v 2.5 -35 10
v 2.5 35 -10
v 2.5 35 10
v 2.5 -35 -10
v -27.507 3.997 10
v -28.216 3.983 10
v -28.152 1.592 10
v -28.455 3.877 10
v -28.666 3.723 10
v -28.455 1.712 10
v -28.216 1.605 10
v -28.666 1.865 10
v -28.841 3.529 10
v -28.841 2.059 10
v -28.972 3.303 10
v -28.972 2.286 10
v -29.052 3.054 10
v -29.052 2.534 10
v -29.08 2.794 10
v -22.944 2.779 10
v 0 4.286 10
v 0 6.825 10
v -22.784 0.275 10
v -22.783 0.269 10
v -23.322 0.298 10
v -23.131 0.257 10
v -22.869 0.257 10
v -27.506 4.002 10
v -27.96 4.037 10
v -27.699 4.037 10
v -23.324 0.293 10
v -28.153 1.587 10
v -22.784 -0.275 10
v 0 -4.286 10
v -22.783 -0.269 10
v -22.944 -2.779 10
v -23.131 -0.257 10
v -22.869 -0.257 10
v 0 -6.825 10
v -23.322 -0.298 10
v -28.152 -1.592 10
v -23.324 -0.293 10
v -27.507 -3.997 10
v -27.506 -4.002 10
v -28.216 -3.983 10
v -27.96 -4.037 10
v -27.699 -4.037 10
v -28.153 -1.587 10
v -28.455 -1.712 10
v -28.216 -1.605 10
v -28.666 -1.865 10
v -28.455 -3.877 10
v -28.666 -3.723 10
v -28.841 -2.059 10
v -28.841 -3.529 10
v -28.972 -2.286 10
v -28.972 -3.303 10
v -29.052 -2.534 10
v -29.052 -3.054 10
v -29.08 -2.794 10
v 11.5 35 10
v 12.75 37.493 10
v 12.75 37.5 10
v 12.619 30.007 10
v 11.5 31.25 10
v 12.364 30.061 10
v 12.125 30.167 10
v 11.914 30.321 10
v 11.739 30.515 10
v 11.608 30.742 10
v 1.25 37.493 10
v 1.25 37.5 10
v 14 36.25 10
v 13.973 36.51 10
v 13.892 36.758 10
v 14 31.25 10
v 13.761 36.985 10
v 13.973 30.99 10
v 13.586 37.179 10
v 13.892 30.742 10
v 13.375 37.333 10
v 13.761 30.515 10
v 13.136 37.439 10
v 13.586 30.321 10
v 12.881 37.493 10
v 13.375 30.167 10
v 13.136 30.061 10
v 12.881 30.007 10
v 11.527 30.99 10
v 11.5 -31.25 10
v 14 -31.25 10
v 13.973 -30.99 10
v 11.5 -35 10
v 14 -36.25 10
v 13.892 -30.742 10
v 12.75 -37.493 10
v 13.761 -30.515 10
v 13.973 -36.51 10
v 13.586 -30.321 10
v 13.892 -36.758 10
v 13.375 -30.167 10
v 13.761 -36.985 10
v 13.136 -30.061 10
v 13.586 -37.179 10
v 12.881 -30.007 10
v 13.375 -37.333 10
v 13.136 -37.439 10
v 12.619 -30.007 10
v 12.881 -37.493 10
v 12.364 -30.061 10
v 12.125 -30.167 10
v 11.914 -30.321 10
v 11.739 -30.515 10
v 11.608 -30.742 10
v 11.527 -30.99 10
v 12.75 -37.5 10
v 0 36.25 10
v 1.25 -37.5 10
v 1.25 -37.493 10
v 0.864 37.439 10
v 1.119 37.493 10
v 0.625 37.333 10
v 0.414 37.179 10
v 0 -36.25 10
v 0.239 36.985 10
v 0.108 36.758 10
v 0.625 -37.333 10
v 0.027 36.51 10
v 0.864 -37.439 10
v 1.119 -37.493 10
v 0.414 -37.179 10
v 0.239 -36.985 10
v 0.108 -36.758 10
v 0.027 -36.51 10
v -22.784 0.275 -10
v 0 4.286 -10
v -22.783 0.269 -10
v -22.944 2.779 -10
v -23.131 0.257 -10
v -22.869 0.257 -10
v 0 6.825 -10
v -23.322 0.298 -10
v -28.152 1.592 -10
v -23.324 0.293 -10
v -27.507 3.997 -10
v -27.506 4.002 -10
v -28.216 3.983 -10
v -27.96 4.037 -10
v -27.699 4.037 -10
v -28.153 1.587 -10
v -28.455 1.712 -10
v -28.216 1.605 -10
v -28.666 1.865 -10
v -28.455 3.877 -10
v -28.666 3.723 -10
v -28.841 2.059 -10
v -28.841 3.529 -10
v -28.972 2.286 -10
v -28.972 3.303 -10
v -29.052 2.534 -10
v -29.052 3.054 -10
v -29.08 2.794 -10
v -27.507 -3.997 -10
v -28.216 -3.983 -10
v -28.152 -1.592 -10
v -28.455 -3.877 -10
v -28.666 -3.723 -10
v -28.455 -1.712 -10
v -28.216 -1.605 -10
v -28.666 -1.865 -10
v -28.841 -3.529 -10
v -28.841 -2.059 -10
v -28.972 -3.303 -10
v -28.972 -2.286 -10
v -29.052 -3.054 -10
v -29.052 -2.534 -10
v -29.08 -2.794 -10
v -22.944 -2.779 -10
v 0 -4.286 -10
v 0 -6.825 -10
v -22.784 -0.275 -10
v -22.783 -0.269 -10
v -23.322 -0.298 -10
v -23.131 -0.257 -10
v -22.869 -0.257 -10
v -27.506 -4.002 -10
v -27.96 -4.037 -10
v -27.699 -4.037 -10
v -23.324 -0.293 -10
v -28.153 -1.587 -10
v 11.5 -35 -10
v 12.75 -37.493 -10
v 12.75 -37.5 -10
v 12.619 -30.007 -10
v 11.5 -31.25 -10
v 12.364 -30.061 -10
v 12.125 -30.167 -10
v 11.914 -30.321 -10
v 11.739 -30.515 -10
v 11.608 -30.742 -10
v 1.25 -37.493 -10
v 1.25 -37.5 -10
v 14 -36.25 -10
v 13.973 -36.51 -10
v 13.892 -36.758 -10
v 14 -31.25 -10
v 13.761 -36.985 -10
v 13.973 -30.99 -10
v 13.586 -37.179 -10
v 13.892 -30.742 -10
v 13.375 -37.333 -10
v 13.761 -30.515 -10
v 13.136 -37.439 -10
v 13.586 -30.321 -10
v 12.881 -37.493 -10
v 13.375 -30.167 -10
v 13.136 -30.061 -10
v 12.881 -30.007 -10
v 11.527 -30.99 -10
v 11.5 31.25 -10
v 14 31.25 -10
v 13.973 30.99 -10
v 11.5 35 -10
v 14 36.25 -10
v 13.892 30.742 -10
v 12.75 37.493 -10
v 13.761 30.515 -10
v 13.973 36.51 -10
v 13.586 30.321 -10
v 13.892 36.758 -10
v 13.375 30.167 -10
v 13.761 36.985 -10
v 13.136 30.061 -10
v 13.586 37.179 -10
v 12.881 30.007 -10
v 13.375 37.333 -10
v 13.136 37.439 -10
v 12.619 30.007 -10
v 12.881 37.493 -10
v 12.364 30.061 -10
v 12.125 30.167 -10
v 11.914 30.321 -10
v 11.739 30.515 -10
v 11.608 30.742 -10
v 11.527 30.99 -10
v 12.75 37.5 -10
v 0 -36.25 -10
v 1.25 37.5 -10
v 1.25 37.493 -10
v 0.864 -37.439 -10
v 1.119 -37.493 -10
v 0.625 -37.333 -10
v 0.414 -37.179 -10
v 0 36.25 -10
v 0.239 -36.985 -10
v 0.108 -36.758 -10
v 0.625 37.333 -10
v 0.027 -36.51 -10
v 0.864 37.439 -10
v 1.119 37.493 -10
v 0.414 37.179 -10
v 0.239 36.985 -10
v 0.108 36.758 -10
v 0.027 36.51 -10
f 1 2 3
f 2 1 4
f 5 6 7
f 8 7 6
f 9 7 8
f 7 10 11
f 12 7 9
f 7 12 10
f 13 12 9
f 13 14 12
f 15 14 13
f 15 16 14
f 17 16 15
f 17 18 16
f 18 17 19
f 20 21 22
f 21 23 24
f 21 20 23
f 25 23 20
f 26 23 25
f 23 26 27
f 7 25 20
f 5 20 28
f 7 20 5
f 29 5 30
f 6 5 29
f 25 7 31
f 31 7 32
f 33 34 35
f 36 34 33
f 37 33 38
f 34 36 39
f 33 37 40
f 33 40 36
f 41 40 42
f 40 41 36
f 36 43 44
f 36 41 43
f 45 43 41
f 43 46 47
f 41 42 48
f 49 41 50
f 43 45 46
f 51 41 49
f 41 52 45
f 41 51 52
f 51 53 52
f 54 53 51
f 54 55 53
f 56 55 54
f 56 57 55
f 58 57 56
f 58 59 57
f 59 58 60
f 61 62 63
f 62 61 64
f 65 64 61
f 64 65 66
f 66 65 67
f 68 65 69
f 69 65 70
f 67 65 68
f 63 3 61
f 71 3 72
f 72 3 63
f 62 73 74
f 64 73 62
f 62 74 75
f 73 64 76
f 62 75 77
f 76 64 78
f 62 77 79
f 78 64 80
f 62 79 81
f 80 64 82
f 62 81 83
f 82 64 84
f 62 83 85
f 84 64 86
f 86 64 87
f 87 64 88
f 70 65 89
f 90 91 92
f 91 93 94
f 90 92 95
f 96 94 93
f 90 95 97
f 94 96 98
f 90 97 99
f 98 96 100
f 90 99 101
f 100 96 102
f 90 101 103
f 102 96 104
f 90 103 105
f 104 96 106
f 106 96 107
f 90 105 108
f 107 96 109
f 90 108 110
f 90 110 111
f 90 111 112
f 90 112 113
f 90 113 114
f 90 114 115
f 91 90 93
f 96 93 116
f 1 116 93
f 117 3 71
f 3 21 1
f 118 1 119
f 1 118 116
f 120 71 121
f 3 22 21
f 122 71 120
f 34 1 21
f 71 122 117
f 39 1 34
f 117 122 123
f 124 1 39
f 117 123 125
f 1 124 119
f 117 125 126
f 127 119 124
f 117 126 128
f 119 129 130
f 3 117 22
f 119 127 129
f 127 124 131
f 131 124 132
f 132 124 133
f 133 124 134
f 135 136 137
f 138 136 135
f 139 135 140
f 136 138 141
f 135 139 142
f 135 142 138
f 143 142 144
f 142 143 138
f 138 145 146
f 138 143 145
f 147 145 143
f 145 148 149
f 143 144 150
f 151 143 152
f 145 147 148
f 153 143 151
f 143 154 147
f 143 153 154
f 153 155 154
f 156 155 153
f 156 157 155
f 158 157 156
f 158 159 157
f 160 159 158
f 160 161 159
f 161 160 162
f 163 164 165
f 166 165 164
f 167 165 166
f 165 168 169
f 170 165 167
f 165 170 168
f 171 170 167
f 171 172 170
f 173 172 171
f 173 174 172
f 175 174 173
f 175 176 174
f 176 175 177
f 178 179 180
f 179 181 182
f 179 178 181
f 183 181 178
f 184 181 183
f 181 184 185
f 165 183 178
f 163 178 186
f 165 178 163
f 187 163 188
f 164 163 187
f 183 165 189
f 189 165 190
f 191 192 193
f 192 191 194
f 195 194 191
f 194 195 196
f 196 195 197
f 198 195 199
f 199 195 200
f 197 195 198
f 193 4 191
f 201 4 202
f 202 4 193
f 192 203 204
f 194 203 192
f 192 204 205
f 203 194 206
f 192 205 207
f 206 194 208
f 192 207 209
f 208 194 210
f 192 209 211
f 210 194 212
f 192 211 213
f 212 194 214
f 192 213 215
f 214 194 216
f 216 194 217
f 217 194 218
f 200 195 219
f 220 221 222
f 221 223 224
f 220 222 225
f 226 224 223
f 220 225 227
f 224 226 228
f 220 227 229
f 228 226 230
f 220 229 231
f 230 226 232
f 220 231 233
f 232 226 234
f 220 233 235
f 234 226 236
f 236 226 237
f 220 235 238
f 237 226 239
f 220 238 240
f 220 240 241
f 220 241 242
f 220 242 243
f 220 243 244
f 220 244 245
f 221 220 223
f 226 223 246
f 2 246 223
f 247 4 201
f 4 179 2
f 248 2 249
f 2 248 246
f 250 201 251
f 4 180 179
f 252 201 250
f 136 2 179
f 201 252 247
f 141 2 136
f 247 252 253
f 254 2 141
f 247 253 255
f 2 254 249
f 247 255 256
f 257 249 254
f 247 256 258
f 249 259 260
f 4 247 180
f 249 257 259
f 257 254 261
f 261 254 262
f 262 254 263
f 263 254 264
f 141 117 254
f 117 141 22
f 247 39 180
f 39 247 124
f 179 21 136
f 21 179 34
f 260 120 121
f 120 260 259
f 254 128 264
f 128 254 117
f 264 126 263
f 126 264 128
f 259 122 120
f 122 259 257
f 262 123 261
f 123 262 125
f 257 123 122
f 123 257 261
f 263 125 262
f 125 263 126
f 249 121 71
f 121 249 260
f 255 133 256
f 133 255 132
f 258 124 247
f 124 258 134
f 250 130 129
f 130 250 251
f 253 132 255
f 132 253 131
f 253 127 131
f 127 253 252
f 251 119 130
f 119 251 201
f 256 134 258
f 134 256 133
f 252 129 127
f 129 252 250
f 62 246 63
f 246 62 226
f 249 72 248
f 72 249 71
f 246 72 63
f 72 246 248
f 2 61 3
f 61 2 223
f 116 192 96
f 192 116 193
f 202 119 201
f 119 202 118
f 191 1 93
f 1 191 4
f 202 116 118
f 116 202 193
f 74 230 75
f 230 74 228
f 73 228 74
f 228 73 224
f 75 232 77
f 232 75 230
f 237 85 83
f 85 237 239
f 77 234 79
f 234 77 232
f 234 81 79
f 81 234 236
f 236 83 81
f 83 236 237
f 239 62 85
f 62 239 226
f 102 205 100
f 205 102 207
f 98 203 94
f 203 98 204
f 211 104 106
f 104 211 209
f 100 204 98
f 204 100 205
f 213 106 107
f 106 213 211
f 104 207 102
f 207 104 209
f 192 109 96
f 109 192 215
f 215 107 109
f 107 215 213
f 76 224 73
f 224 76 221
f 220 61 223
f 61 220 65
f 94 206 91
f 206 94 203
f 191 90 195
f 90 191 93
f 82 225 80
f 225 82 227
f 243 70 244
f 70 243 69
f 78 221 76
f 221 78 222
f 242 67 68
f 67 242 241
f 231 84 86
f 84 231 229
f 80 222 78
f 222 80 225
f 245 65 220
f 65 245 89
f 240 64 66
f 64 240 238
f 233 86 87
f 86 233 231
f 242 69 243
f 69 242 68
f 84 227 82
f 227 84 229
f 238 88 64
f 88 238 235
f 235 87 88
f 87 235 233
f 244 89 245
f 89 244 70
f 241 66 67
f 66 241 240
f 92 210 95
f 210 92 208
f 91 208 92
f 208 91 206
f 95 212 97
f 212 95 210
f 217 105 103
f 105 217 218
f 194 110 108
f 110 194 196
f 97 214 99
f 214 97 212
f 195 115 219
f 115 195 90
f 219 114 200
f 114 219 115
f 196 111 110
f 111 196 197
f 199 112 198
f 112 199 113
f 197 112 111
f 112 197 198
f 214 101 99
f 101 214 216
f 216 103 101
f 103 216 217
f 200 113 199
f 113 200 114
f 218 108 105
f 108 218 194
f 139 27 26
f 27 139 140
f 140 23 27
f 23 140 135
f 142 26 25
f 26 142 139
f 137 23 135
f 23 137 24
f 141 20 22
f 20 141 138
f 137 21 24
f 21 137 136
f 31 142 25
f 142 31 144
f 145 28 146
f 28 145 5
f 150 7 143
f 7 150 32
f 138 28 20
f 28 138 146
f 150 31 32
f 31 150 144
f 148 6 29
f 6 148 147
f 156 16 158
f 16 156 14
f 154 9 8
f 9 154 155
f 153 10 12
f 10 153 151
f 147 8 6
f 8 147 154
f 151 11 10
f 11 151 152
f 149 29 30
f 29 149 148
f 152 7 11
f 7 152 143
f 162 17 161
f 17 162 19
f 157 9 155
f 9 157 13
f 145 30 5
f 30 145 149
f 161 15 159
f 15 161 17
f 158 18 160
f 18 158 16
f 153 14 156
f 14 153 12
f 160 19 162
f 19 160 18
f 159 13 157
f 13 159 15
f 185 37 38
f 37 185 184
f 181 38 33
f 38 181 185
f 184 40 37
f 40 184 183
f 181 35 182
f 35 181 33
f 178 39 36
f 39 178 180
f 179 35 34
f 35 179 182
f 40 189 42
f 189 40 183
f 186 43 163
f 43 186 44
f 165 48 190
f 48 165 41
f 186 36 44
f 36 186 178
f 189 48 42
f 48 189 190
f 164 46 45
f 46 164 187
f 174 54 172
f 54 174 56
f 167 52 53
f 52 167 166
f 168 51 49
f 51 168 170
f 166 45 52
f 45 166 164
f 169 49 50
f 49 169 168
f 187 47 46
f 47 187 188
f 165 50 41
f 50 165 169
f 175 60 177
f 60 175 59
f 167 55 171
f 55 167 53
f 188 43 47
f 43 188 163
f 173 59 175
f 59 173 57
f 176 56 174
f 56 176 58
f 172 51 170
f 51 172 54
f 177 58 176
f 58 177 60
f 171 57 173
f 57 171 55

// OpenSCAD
//made by RevisionNr3

/* [Basic Settings] */

// Width of your smartphone (with cover if you use one) in mm (please note: numbers like 70, 70.1 and 70.15 work, but numbers like 70. and 70.10 generate errors in customizer).
smartphone_width=70; //
// Thickness of your smartphone (with cover if you use one) in mm.
smartphone_thickness=9; //
// Height of the printed part. 20mm is enough to hold a phone.
bracket_height=20;
// Thickness of the printed part. 2.5 to 3 mm is a good value. The thicker, the stronger the part and clamp.
thickness=2.5; //[1:0.1:6]
// Rotation of the clamp. Adjust if you don't have a horizontal air frame.
clamp_rotation=0; //[0:1:70]
// Gap between the clamp. 0.5 works for most cars.
clamp_gap=0.5; //[0.1:0.1:5]
// Clamp length. A value around 25mm should work for most cars.
clamp_length=23;  //[15:1:50]

/* [Less important Settings] */

// Length of the small bracket ends
bracket_small_ends=5; //[3:1:15]
// Angle at which the clamp closes
clamp_angle1=20; //[15:1:35]
// Angle to center on air frame
clamp_angle2=30; //[30:1:45]
// Length of the small ends on the clamp
clamp_centering_length=5; //[3:1:10]

/* [hidden] */

//calculations
//------------

//calculate clamp height and width based on the previous parameters
clamp_width=calc_wc();
clamp_height=calc_hc();
clamp_width_rotated=calc_wc_rotated();
clamp_height_rotated=calc_hc_rotated();

// code for bracket
//----------------
bracket(thickness,bracket_height,smartphone_width,smartphone_thickness);

// code for clamp
//---------------
difference(){
    
rotate([clamp_rotation,0,0]){ //rotate the clamp around the angle, max 60°

clamp_one_side(thickness,clamp_length,clamp_height,clamp_gap);
mirror([0,1,0])
clamp_one_side(thickness,clamp_length,clamp_height,clamp_gap); 
}

//these cubes will cut off the top,bottom and sides of the clamps, so the clamp stays within the bracket's outside dimensions.
cube_for_cut();
mirror([0,0,1]) cube_for_cut();
cube_for_cut2();
mirror([0,1,0]) cube_for_cut2();
}

//modules
//-------

module bracket(thickness,height,smartphone_width,smartphone_thickness){
    
//long piece
    translate([thickness/2,0,0])
cube([thickness,smartphone_width+thickness,height],center=true);

//2 cylinders at end of long piece
translate([thickness/2,smartphone_width/2+thickness/2,0]) cylinder(h=height,r=thickness/2,center=true,$fn=30);

translate([thickness/2,-smartphone_width/2-thickness/2,0]) cylinder(h=height,r=thickness/2,center=true,$fn=30);

//2 short cubes to clamp phone
translate([smartphone_thickness/2+thickness,smartphone_width/2+thickness/2,0]) cube([smartphone_thickness+thickness,thickness,height],center=true);

translate([smartphone_thickness/2+thickness,-smartphone_width/2-thickness/2,0]) cube([smartphone_thickness+thickness,thickness,height],center=true);

//2 cylinders at end of previous cubes
translate([smartphone_thickness+3/2*thickness,smartphone_width/2+thickness/2,0]) cylinder(h=height,r=thickness/2,center=true,$fn=30);

translate([smartphone_thickness+3/2*thickness,-smartphone_width/2-thickness/2,0]) cylinder(h=height,r=thickness/2,center=true,$fn=30);

//2 cubes to keep smartphone in the bracket
translate([smartphone_thickness+3/2*thickness,smartphone_width/2-bracket_small_ends/2+thickness/2]) cube([thickness,bracket_small_ends,height],center=true);

translate([smartphone_thickness+3/2*thickness,-smartphone_width/2+bracket_small_ends/2-thickness/2,0]) cube([thickness,bracket_small_ends,height],center=true);

//2 cylinders at end of previous cubes
translate([smartphone_thickness+3/2*thickness,smartphone_width/2-bracket_small_ends+thickness/2,0]) cylinder(h=height,r=thickness/2,center=true,$fn=30);

translate([smartphone_thickness+3/2*thickness,-smartphone_width/2+bracket_small_ends-thickness/2,0]) cylinder(h=height,r=thickness/2,center=true,$fn=30);
}

module clamp_one_side(thickness,length,height,distance){
    
translate([-length,0,0]){    
//cylinder    
translate([0,thickness/2+distance/2,-height/2]) 
cylinder(r=thickness/2,h=height,$fn=30);

//cube
translate([0,thickness/2+distance/2,0])
rotate([0,0,clamp_angle1/2])
translate([1/2*(length/(cos(clamp_angle1/2))+thickness/2*tan(clamp_angle1/2)),0,0]) 
cube([length/cos(clamp_angle1/2)+thickness/2*tan(clamp_angle1/2),thickness,height],center=true);

//cube
translate([0,thickness/2+distance/2,0])
rotate([0,0,-clamp_angle2/2])
translate([-clamp_centering_length/2,0,0]) 
cube([clamp_centering_length,thickness,height],center=true);

//cylinder
translate([-cos(clamp_angle2/2)*clamp_centering_length,thickness/2+distance/2+sin(clamp_angle2/2)*clamp_centering_length,-height/2]) 
cylinder(r=thickness/2,h=height,$fn=30);
}
}

module cube_for_cut(){ //for cutting the clamp off in the length direction (length direction = x axis, same direction as smartphone thickness)
    
tl=calc_total_length();
tw=calc_total_width();

translate([-tl+thickness,-tw/2,bracket_height/2])
cube([tl,tw,clamp_height]);
}

module cube_for_cut2(){ //for cutting the clamp off in the width direction if needed (width direction = y axis, same direction as smartphone width)
    
tl=calc_total_length();
tw=calc_total_width();
    
translate([-tl+thickness,smartphone_width/2+thickness,-clamp_height/2])
cube([tl,tw,clamp_height]); 
}


//functions
//---------

function calc_wc()= //wc stands for width clamp
    2*clamp_length*tan(clamp_angle2/2)+2*thickness*cos(clamp_angle2/2)+clamp_gap;

function calc_hc()= //hc stands for height clamp
    bracket_height/cos(clamp_rotation)+calc_wc()*tan(clamp_rotation); //wb stands for width bracket, a max for the maximal angle to which the clamp can be rotated (i take this to be 60°)

function calc_hc_rotated()=
    bracket_height+2*calc_wc()*sin(clamp_rotation);

function calc_wc_rotated()=
    calc_wc()*cos(clamp_rotation)+calc_hc()*sin(clamp_rotation);

function calc_total_width()= //total width of the part (width in the same direction as smarthone width)
max(calc_wc_rotated(),smartphone_width+2*thickness);

function calc_total_length()= //total length of the part
2*thickness+smartphone_thickness+clamp_length+clamp_centering_length*cos(clamp_angle1/2)+thickness/2;
